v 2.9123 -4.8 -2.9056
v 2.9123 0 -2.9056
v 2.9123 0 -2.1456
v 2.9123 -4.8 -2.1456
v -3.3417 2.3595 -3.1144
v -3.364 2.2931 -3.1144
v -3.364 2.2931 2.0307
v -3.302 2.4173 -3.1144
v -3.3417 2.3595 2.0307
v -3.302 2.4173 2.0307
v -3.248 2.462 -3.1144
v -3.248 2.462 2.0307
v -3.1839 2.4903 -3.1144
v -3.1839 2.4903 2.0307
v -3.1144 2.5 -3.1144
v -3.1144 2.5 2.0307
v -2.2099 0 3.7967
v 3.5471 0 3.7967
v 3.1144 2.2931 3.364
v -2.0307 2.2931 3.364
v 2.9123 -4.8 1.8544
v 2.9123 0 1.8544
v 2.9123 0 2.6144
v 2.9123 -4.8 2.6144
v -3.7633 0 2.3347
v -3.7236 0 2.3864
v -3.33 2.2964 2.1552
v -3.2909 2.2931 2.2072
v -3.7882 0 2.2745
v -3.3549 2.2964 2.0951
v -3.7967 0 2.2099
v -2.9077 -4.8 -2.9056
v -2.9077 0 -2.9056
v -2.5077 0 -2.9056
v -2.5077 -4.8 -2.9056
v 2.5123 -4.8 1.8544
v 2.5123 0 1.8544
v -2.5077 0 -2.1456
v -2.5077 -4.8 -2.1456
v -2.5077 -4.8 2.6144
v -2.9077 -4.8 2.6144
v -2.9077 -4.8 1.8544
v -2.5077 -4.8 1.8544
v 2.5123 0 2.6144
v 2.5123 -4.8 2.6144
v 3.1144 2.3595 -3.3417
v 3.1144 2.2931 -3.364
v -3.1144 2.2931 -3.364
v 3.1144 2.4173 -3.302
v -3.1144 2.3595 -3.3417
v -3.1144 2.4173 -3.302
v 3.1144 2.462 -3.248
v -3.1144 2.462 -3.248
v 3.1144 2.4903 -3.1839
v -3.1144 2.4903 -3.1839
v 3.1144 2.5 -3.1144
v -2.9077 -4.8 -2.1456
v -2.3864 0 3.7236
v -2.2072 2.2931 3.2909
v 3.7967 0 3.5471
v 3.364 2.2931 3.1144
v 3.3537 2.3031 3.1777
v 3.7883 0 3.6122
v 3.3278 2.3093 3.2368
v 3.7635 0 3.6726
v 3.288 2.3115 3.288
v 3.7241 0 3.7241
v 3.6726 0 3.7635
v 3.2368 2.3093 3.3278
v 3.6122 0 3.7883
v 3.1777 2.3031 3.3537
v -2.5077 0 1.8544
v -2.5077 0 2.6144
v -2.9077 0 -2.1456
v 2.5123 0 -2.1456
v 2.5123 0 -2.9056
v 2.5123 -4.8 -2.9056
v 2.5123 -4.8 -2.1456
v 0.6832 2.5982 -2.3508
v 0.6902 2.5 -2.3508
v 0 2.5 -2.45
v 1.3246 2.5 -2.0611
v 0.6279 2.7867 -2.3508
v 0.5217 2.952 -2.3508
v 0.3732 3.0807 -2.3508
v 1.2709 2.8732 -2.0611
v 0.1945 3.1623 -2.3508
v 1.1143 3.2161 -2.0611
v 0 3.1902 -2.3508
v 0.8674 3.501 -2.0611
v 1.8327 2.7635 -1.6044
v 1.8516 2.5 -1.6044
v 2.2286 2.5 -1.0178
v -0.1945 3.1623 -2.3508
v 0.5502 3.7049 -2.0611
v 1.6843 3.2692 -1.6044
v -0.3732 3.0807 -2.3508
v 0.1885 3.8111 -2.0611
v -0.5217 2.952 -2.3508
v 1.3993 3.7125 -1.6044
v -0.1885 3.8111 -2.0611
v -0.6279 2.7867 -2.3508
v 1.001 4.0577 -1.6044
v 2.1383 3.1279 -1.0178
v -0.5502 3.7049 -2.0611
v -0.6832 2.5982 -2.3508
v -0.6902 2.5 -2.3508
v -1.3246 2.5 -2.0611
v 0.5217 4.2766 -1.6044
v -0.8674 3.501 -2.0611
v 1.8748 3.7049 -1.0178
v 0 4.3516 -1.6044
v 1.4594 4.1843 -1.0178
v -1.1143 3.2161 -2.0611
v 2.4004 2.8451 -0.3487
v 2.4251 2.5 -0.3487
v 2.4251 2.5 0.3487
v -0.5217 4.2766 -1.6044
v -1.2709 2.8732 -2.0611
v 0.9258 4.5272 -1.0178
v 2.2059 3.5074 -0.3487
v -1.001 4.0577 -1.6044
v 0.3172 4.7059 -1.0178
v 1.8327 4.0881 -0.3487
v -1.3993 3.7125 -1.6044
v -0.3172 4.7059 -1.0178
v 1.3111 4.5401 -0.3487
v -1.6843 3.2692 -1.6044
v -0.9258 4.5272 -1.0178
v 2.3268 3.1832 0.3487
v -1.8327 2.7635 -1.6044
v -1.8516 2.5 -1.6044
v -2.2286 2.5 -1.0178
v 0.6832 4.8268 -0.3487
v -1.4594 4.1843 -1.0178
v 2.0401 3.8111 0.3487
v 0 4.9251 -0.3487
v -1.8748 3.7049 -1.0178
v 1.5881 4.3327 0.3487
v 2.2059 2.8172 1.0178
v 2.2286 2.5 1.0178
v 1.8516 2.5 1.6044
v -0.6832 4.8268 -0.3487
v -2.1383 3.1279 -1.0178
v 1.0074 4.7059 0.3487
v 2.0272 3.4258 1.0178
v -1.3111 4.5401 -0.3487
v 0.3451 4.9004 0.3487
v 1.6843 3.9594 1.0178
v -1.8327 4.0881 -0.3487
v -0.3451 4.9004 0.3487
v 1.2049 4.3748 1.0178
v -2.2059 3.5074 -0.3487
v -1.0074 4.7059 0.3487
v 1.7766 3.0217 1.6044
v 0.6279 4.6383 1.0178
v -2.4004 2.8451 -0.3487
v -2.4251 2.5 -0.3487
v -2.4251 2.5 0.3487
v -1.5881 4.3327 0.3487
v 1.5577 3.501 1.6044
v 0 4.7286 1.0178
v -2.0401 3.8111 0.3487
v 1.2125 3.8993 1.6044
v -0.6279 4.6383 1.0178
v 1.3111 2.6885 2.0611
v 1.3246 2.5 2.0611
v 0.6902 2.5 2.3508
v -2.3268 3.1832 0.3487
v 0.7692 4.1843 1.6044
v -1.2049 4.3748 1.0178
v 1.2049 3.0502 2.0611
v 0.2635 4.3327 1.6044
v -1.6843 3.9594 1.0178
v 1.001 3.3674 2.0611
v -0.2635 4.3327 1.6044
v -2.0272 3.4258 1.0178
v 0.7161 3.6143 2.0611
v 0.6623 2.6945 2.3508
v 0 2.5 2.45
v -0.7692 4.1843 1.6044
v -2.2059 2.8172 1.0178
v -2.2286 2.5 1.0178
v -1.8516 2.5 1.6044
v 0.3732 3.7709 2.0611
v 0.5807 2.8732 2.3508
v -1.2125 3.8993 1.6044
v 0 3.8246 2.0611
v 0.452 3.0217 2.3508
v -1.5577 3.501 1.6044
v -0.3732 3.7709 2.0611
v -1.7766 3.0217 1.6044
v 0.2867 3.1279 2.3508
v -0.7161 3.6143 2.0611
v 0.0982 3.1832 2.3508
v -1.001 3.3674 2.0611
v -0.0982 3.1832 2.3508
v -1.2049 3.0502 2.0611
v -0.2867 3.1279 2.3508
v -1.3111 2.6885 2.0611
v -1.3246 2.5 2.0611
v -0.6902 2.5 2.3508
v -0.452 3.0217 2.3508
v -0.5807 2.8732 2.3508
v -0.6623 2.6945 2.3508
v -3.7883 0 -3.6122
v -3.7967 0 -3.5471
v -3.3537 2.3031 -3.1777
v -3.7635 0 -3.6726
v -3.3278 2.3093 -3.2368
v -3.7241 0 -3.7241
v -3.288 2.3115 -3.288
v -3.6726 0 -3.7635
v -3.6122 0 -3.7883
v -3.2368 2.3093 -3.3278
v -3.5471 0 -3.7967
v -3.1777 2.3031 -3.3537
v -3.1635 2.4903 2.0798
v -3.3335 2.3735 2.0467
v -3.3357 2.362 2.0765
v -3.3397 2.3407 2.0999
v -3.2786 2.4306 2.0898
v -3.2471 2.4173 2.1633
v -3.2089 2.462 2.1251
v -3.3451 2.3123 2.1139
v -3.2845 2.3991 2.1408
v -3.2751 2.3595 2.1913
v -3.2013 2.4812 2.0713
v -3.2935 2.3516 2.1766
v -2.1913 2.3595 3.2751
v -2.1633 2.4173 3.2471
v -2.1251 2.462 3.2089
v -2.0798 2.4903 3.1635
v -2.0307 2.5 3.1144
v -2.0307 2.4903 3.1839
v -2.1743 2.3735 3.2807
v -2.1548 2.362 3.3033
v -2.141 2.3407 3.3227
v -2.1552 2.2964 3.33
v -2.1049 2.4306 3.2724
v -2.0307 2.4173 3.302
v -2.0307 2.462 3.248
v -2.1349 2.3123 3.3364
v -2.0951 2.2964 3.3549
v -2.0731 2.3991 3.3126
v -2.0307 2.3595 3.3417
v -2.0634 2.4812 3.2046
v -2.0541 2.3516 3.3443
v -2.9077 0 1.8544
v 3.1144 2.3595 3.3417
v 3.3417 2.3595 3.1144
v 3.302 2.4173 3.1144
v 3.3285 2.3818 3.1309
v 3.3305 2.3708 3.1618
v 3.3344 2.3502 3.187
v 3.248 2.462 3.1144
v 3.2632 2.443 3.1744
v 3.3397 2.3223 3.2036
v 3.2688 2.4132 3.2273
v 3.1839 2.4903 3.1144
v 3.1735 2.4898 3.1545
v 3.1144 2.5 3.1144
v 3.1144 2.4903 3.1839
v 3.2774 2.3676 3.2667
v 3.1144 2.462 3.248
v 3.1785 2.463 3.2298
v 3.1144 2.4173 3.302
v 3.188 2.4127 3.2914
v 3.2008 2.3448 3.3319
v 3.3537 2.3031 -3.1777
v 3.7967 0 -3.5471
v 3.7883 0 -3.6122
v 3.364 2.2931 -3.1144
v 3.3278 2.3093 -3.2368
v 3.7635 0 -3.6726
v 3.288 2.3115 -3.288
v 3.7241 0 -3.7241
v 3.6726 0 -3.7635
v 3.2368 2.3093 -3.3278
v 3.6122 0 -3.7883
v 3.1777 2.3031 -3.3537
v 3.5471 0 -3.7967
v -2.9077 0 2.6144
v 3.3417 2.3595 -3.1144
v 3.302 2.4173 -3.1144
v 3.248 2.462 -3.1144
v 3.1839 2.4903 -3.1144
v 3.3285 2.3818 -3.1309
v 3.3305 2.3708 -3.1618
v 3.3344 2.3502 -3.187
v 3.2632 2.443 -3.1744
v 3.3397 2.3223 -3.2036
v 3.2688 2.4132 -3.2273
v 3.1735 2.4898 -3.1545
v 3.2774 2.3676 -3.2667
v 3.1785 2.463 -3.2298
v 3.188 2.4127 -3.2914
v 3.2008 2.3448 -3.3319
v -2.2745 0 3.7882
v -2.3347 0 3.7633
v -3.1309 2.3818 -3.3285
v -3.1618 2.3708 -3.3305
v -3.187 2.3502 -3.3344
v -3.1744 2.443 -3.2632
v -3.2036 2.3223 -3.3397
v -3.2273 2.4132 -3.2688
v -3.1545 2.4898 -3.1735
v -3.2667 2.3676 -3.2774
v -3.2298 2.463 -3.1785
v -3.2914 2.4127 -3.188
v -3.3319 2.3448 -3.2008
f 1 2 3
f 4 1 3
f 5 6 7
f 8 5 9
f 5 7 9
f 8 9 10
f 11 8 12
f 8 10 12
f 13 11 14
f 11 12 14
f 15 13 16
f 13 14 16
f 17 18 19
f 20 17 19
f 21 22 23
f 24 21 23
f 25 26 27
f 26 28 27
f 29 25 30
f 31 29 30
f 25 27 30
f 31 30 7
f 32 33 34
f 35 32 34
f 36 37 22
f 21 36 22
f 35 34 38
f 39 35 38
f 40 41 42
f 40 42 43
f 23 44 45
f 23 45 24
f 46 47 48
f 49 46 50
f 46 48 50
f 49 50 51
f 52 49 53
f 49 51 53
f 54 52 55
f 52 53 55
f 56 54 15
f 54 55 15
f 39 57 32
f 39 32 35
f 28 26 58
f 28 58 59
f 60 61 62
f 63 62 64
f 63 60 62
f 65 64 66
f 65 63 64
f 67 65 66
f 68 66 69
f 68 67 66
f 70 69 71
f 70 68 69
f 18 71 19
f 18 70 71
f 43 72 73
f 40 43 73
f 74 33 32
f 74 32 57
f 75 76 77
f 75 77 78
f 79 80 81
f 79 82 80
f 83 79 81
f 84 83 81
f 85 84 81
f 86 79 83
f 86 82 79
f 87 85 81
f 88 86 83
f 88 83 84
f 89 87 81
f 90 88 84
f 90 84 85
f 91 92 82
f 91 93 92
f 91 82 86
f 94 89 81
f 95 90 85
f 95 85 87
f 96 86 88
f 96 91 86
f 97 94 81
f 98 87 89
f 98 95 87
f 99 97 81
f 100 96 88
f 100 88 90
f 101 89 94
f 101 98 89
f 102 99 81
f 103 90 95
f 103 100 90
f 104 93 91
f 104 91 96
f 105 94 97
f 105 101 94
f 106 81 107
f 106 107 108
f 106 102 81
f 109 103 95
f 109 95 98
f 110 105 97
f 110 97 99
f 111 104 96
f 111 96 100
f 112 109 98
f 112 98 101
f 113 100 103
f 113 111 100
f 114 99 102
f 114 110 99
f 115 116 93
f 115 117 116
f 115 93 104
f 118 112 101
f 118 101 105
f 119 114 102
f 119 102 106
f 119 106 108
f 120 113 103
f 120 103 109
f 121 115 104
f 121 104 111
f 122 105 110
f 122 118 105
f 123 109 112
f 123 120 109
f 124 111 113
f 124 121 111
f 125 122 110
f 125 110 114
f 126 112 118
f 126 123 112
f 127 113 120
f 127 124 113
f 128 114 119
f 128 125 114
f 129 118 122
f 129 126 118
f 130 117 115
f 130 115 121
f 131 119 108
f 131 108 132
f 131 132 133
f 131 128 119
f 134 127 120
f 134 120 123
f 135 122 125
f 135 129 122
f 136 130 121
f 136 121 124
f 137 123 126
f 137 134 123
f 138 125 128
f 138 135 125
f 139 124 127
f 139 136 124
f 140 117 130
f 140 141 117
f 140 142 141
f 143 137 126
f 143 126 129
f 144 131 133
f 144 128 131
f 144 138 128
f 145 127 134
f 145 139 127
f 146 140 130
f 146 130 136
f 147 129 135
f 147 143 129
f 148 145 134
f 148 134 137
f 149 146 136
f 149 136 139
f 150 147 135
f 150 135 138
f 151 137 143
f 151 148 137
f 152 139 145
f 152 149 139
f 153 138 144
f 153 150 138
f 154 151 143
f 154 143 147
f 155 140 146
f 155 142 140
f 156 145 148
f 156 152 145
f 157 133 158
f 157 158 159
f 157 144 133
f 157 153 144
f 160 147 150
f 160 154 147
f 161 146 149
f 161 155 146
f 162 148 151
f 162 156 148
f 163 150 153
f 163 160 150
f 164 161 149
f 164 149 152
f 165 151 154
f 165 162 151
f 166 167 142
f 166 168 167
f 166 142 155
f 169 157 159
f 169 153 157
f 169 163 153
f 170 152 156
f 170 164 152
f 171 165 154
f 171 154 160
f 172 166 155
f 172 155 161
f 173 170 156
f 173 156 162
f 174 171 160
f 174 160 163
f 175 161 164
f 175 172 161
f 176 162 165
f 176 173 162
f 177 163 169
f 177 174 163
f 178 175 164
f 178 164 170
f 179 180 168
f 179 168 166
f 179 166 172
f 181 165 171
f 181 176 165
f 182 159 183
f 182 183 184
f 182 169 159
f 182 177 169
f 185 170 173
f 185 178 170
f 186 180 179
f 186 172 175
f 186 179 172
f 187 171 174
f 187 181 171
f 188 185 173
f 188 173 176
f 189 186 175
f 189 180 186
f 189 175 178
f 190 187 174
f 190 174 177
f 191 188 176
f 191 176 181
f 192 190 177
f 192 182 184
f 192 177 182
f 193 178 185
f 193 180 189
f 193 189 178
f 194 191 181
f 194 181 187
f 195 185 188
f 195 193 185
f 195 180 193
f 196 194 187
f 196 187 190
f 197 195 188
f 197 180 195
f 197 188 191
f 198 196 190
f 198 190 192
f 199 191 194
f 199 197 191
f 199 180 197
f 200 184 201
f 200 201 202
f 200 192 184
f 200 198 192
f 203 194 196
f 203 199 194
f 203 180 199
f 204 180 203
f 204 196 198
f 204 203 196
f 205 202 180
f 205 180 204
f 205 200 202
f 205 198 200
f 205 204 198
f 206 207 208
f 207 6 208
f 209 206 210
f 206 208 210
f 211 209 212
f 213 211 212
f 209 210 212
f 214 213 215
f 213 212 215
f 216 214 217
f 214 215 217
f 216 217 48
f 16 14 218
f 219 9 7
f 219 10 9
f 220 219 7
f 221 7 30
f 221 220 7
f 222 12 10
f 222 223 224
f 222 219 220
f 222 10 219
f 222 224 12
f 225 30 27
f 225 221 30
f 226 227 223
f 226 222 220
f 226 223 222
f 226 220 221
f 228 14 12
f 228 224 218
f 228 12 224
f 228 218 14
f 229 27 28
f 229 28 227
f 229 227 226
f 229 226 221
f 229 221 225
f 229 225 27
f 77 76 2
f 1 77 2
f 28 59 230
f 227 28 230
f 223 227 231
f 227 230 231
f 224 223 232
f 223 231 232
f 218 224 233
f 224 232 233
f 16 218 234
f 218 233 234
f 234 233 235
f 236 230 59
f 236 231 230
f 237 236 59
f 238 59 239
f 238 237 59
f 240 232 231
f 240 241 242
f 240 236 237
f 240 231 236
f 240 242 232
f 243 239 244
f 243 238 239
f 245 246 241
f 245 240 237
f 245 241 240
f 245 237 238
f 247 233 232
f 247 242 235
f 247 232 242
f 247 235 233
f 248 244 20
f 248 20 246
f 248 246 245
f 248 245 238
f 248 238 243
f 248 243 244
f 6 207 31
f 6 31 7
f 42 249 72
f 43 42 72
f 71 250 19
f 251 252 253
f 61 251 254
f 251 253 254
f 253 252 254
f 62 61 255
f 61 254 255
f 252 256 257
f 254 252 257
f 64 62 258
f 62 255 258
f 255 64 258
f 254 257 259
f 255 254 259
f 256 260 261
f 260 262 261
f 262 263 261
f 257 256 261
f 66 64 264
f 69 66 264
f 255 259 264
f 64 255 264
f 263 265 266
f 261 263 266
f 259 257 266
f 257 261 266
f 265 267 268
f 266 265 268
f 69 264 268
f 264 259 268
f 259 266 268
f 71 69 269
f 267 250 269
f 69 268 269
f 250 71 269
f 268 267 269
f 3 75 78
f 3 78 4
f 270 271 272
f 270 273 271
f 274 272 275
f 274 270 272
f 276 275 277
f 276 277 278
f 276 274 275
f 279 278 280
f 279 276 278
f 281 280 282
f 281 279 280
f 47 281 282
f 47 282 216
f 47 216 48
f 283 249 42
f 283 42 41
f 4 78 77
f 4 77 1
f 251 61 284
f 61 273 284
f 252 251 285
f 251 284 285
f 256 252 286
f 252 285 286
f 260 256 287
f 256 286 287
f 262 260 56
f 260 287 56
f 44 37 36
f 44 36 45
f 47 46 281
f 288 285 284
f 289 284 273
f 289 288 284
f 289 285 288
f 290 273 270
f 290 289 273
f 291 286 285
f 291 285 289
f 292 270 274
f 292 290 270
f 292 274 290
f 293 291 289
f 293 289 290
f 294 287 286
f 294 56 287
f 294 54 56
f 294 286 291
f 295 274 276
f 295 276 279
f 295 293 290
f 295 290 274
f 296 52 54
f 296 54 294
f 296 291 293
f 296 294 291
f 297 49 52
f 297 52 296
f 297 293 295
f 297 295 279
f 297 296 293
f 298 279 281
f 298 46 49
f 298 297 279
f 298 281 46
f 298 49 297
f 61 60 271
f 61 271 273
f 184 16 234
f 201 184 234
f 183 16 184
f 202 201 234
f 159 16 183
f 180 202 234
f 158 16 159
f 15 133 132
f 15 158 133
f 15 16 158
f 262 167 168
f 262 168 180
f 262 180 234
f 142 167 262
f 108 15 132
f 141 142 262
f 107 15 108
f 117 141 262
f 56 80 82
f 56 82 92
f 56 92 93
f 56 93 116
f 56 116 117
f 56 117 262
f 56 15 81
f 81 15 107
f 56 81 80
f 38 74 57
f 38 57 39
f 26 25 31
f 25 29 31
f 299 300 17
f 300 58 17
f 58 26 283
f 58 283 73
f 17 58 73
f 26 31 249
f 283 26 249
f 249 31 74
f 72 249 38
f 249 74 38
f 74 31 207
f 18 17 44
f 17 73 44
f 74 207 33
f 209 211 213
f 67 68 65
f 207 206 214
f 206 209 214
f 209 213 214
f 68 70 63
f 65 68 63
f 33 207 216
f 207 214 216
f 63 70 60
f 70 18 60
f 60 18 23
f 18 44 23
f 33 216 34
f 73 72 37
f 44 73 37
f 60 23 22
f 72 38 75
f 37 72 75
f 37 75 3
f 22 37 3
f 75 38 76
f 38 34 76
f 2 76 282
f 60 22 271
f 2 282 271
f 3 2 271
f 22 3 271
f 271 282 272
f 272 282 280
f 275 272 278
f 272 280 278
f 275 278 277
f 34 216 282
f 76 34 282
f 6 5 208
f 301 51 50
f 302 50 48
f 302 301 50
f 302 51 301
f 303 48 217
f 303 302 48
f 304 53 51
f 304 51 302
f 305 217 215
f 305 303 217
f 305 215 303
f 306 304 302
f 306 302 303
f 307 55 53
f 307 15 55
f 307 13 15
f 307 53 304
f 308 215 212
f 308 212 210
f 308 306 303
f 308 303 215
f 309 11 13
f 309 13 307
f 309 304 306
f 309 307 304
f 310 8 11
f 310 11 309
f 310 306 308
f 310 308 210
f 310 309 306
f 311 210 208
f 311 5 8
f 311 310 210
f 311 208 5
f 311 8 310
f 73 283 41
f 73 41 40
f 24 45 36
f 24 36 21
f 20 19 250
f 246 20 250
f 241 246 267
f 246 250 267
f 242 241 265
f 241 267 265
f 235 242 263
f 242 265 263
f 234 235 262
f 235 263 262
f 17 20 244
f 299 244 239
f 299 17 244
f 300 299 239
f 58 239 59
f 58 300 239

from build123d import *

# Parameters (mm, degrees)
BOSS_EXTRUDE1_DEPTH      = 2.5
CHAMFER1_SIZE            = 2.65
CHAMFER1_SIZE_2          = 0.5
FILLET1_R                = 0.254
REVOLVE1_ANGLE           = 180
REVOLVE1_OTHER_WAY_ANGLE = 180
SKETCH3_W                = 0.4
SKETCH3_H                = 0.76
BOSS_EXTRUDE2_DEPTH      = 4.8


with BuildPart() as part:
    # Sketch1 → Boss-Extrude1 (new body)
    with BuildSketch(Plane(origin=(0, 0, 0), x_dir=(1, 0, 0), z_dir=(0, 1, 0))):
        Polygon((-3.825, -2.325), (-2.325, -3.825), (3.825, -3.825), (3.825, 3.825), (-3.825, 3.825), align=None)
    extrude(amount=BOSS_EXTRUDE1_DEPTH)

    # Chamfer1
    # the kernel refuses this chamfer: 2.65, 0.5 mm, written as the material it takes off along each edge
    with BuildSketch(Plane(origin=(3.825, 2.5, 10.710580639), x_dir=(0.007135648431947453, -0.9999745409366458, 0), z_dir=(0, 0, -1)), Plane(origin=(10.710580639, 2.5, -3.825), x_dir=(0, -0.9999745409366458, -0.007135648431947453), z_dir=(-1, 0, 0))) as chamfer1_piece_1:
        Polygon((CHAMFER1_SIZE * 0.999974540937, CHAMFER1_SIZE * 0.00713564843195), (-CHAMFER1_SIZE_2 * 0.00713564843195, CHAMFER1_SIZE_2 * 0.999974540937), (0, 0), align=None)
    extrude(amount=21.421161277, mode=Mode.SUBTRACT)
    with BuildSketch(Plane(origin=(-3.825, 2.5, -10.710580639), x_dir=(-0.007135648431947453, -0.9999745409366458, 0), z_dir=(0, 0, 1)), Plane(origin=(-9.210580639, 2.5, 3.825), x_dir=(0, -0.9999745409366458, 0.007135648431947453), z_dir=(1, 0, 0))) as chamfer1_piece_2:
        Polygon((CHAMFER1_SIZE * 0.999974540937, CHAMFER1_SIZE * 0.00713564843195), (-CHAMFER1_SIZE_2 * 0.00713564843195, CHAMFER1_SIZE_2 * 0.999974540937), (0, 0), align=None)
    extrude(amount=19.921161277, mode=Mode.SUBTRACT)
    with BuildSketch(Plane(origin=(-8.693840762, 2.5, -2.543840762), x_dir=(-0.0050456653943929935, -0.9999745409366458, 0.005045665394392992), z_dir=(0.7071067811865475, 0, 0.7071067811865476))) as chamfer1_piece_3:
        Polygon((CHAMFER1_SIZE * 0.999974540937, CHAMFER1_SIZE * 0.00713564843195), (-CHAMFER1_SIZE_2 * 0.00713564843195, CHAMFER1_SIZE_2 * 0.999974540937), (0, 0), align=None)
    extrude(amount=15.892481621, mode=Mode.SUBTRACT)

    # Fillet1
    fillet1_edges = [part.edges().sort_by_distance(p)[0] for p in [
        (0.603553391, 2.5, 3.325),
        (-2.721446609, 2.5, 2.721446609),
        (-3.325, 2.5, -0.603553391),
        (0, 2.5, -3.325),
        (3.325, 2.5, 0),
        (-3.560849057, 1.25, 2.215585097),
        (-2.215585097, 1.25, 3.560849057),
        (-3.560849057, 1.25, -3.560849057),
        (3.560849057, 1.25, 3.560849057),
        (3.560849057, 1.25, -3.560849057),
    ]]
    fillet(fillet1_edges, radius=FILLET1_R)

    # Sketch2 → Revolve1 (revolve)
    with BuildSketch(Plane(origin=(0, 2.5, 0), x_dir=(1, 0, 0), z_dir=(0, 1, 0))):
        with BuildLine():
            Line((0, -2.45), (0, 2.45))
            ThreePointArc((0, 2.45), (2.45, 0), (0, -2.45))
        make_face()
    revolve(axis=Axis((0, 2.5, 2.45), (0, 0, -1)), revolution_arc=REVOLVE1_ANGLE)

    # Sketch2 → Revolve1 other way (revolve)
    with BuildSketch(Plane(origin=(0, 2.5, 0), x_dir=(1, 0, 0), z_dir=(0, 1, 0))):
        with BuildLine():
            Line((0, -2.45), (0, 2.45))
            ThreePointArc((0, 2.45), (2.45, 0), (0, -2.45))
        make_face()
    revolve(axis=Axis((0, 2.5, 2.45), (0, 0, 1)), revolution_arc=REVOLVE1_OTHER_WAY_ANGLE)

    # Sketch3 → Boss-Extrude2 (add)
    with BuildSketch(Plane.XZ):
        with Locations((-2.707698113, 2.234442884)):
            Rectangle(SKETCH3_W, SKETCH3_H)
        with Locations((-2.707698113, -2.525557116)):
            Rectangle(SKETCH3_W, SKETCH3_H)
        with Locations((2.712301887, -2.525557116)):
            Rectangle(SKETCH3_W, SKETCH3_H)
        with Locations((2.712301887, 2.234442884)):
            Rectangle(SKETCH3_W, SKETCH3_H)
    extrude(amount=BOSS_EXTRUDE2_DEPTH)


solid = part.part
